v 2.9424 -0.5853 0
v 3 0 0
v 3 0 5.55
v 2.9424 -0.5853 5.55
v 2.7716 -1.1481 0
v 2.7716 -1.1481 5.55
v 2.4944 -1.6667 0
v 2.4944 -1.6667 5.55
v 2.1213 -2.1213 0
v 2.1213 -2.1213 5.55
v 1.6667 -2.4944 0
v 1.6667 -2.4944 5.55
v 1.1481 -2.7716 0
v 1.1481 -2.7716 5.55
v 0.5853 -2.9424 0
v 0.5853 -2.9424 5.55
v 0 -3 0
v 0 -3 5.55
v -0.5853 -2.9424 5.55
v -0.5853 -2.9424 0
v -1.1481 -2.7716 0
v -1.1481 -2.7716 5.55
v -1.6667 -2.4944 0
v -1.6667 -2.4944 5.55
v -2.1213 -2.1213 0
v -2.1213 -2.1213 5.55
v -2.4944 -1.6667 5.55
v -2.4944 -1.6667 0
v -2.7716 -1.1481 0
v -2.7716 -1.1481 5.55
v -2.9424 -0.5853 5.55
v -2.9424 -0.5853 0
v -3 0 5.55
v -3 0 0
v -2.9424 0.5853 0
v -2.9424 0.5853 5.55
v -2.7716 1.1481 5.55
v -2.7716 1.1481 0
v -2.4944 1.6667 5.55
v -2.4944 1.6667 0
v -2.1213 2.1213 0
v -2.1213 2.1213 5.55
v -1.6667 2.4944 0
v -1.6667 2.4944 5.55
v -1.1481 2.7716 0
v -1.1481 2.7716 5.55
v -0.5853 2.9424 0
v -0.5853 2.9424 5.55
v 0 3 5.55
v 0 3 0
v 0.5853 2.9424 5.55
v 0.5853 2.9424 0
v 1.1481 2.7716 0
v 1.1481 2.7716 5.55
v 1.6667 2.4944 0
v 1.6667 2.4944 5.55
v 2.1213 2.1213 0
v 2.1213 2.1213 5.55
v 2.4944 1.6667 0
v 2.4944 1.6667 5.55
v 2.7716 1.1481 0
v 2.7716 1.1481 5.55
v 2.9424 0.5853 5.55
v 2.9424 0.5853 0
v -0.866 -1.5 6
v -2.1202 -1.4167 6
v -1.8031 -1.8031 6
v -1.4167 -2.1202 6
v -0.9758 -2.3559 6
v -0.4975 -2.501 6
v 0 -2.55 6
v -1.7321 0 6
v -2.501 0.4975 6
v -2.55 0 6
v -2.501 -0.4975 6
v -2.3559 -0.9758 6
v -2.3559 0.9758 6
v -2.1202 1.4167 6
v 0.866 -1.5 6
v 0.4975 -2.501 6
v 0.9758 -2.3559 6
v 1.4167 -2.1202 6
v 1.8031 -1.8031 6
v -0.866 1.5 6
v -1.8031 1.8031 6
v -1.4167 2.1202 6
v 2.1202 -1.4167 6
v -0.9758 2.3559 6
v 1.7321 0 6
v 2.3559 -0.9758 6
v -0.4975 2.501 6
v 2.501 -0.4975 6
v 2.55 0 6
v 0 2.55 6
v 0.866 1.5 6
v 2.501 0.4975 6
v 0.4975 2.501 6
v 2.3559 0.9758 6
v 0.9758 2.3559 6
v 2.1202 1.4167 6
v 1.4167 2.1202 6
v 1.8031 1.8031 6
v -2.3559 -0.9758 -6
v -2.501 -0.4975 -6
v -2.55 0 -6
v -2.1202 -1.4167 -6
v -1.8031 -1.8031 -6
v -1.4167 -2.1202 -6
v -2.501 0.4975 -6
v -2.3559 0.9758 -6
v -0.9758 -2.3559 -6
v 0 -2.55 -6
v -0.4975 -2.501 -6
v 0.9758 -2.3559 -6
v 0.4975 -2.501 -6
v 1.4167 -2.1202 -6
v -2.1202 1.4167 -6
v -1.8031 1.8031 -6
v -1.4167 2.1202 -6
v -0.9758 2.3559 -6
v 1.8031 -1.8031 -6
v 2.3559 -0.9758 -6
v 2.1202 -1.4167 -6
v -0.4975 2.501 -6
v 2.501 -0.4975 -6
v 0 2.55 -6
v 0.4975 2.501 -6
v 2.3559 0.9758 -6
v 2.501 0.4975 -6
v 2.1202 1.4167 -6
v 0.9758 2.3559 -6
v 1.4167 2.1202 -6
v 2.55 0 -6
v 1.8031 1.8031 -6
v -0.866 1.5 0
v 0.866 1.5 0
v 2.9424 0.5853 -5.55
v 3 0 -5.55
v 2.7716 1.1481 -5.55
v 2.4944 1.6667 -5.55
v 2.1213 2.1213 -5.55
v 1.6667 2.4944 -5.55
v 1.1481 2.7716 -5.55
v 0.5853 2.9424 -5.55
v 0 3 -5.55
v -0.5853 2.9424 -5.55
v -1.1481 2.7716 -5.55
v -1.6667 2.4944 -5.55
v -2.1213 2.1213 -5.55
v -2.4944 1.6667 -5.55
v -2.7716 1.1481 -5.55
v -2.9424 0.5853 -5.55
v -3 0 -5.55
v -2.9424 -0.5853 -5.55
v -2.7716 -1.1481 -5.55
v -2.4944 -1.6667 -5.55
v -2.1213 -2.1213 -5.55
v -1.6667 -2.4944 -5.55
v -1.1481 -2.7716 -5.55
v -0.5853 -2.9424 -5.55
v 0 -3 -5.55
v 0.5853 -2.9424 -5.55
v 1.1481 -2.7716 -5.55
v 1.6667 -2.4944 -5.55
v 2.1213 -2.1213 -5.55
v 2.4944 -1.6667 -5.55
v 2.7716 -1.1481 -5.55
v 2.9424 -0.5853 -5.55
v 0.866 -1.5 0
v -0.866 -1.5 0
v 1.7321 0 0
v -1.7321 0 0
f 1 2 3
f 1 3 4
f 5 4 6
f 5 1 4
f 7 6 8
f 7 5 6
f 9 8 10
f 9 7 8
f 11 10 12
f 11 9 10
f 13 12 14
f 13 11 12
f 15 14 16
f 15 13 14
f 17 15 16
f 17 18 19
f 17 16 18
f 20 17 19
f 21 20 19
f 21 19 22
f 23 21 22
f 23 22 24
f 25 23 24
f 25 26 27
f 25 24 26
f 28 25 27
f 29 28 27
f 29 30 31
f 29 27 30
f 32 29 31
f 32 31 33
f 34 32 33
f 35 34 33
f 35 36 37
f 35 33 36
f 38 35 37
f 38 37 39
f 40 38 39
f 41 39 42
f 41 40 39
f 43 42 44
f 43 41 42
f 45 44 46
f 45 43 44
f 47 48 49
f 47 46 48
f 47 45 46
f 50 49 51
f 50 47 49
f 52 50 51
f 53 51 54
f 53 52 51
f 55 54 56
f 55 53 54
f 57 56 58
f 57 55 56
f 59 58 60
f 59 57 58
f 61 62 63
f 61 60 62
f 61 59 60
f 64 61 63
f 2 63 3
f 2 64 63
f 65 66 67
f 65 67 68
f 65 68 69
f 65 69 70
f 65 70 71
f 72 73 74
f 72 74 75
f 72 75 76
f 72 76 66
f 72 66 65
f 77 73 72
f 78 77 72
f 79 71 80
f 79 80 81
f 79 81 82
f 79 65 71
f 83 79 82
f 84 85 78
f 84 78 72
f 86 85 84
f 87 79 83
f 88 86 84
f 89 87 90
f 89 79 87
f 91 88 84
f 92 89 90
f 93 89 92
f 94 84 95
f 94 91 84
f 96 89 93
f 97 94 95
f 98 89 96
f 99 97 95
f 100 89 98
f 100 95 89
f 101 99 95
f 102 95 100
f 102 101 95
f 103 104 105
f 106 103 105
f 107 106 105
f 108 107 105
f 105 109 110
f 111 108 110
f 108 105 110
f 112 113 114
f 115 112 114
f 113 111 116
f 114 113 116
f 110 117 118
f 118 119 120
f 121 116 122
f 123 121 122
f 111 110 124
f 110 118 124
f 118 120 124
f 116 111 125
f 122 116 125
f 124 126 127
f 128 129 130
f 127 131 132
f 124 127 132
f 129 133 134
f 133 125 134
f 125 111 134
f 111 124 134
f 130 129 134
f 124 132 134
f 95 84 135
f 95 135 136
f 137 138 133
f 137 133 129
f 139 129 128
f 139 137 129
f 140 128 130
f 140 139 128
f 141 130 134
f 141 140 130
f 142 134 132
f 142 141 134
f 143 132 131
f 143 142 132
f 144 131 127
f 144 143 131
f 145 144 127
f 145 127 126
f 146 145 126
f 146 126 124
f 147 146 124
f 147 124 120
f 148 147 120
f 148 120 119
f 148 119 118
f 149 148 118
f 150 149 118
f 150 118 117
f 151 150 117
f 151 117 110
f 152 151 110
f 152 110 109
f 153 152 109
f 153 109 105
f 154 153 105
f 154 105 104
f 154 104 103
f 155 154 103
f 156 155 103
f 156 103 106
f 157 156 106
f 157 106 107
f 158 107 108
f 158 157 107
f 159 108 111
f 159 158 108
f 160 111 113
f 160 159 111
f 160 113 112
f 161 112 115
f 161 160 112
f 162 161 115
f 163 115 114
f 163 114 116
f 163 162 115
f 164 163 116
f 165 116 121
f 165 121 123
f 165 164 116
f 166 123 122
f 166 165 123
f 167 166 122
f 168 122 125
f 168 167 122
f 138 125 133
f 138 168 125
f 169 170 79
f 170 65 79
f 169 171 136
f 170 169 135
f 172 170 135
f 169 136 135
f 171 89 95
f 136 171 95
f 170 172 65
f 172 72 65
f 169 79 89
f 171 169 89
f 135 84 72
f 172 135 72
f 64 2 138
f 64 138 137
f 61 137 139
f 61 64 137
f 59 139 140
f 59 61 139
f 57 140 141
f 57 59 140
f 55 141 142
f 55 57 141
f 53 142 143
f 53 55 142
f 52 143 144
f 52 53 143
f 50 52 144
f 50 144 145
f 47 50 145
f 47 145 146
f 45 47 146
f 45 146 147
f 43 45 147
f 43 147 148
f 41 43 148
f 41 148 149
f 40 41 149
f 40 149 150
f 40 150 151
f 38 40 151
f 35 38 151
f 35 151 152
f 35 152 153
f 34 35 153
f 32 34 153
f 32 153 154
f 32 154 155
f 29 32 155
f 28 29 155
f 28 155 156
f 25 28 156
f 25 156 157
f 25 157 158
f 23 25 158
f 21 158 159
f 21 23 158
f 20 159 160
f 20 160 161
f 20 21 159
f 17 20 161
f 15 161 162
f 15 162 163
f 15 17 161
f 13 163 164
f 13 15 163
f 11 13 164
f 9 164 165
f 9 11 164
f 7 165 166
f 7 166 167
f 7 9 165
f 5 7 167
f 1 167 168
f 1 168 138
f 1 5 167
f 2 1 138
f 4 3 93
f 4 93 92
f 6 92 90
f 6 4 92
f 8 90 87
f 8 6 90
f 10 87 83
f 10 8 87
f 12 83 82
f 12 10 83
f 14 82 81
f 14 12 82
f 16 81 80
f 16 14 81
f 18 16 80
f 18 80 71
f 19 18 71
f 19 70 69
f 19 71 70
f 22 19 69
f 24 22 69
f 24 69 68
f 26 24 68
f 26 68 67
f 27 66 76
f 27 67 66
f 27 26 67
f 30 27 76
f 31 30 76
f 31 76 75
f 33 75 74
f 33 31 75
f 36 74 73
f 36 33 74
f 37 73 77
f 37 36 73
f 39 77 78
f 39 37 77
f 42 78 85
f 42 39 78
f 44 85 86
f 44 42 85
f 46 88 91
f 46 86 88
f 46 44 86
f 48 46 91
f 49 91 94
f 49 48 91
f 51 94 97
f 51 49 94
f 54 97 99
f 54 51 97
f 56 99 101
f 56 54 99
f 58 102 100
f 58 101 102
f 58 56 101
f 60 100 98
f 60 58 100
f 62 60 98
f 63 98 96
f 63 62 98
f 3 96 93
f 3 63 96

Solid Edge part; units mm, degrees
sketch "Sketch1" plane through (0, 0, 0) normal (0, 0, 1) x (1, 0, 0)
  circle A0 centre (0, 0) radius 3
  dimension "D1" = 6
extrude "Protrusion1" add sketch "Sketch1" along normal mid plane 12
chamfer "Chamfer1" distance 0.45 angle 45 2 edges at (-3, 0, -6) (-3, 0, 6)
sketch "Sketch2" plane through (0, 0, 6) normal (0, 0, 1) x (1, 0, 0)
  line L0 (-0.866, 1.5) -> (0.866, 1.5)
  line L1 (1.7321, 0) -> (0.866, 1.5)
  line L2 (0.866, -1.5) -> (1.7321, 0)
  line L3 (-0.866, -1.5) -> (0.866, -1.5)
  line L4 (-1.7321, 0) -> (-0.866, -1.5)
  line L5 (-0.866, 1.5) -> (-1.7321, 0)
  dimension "D1" = 3
extrude "Cutout1" cut sketch "Sketch2" against normal blind 6
properties part number "185797" material "Stainless Steel, 304"
